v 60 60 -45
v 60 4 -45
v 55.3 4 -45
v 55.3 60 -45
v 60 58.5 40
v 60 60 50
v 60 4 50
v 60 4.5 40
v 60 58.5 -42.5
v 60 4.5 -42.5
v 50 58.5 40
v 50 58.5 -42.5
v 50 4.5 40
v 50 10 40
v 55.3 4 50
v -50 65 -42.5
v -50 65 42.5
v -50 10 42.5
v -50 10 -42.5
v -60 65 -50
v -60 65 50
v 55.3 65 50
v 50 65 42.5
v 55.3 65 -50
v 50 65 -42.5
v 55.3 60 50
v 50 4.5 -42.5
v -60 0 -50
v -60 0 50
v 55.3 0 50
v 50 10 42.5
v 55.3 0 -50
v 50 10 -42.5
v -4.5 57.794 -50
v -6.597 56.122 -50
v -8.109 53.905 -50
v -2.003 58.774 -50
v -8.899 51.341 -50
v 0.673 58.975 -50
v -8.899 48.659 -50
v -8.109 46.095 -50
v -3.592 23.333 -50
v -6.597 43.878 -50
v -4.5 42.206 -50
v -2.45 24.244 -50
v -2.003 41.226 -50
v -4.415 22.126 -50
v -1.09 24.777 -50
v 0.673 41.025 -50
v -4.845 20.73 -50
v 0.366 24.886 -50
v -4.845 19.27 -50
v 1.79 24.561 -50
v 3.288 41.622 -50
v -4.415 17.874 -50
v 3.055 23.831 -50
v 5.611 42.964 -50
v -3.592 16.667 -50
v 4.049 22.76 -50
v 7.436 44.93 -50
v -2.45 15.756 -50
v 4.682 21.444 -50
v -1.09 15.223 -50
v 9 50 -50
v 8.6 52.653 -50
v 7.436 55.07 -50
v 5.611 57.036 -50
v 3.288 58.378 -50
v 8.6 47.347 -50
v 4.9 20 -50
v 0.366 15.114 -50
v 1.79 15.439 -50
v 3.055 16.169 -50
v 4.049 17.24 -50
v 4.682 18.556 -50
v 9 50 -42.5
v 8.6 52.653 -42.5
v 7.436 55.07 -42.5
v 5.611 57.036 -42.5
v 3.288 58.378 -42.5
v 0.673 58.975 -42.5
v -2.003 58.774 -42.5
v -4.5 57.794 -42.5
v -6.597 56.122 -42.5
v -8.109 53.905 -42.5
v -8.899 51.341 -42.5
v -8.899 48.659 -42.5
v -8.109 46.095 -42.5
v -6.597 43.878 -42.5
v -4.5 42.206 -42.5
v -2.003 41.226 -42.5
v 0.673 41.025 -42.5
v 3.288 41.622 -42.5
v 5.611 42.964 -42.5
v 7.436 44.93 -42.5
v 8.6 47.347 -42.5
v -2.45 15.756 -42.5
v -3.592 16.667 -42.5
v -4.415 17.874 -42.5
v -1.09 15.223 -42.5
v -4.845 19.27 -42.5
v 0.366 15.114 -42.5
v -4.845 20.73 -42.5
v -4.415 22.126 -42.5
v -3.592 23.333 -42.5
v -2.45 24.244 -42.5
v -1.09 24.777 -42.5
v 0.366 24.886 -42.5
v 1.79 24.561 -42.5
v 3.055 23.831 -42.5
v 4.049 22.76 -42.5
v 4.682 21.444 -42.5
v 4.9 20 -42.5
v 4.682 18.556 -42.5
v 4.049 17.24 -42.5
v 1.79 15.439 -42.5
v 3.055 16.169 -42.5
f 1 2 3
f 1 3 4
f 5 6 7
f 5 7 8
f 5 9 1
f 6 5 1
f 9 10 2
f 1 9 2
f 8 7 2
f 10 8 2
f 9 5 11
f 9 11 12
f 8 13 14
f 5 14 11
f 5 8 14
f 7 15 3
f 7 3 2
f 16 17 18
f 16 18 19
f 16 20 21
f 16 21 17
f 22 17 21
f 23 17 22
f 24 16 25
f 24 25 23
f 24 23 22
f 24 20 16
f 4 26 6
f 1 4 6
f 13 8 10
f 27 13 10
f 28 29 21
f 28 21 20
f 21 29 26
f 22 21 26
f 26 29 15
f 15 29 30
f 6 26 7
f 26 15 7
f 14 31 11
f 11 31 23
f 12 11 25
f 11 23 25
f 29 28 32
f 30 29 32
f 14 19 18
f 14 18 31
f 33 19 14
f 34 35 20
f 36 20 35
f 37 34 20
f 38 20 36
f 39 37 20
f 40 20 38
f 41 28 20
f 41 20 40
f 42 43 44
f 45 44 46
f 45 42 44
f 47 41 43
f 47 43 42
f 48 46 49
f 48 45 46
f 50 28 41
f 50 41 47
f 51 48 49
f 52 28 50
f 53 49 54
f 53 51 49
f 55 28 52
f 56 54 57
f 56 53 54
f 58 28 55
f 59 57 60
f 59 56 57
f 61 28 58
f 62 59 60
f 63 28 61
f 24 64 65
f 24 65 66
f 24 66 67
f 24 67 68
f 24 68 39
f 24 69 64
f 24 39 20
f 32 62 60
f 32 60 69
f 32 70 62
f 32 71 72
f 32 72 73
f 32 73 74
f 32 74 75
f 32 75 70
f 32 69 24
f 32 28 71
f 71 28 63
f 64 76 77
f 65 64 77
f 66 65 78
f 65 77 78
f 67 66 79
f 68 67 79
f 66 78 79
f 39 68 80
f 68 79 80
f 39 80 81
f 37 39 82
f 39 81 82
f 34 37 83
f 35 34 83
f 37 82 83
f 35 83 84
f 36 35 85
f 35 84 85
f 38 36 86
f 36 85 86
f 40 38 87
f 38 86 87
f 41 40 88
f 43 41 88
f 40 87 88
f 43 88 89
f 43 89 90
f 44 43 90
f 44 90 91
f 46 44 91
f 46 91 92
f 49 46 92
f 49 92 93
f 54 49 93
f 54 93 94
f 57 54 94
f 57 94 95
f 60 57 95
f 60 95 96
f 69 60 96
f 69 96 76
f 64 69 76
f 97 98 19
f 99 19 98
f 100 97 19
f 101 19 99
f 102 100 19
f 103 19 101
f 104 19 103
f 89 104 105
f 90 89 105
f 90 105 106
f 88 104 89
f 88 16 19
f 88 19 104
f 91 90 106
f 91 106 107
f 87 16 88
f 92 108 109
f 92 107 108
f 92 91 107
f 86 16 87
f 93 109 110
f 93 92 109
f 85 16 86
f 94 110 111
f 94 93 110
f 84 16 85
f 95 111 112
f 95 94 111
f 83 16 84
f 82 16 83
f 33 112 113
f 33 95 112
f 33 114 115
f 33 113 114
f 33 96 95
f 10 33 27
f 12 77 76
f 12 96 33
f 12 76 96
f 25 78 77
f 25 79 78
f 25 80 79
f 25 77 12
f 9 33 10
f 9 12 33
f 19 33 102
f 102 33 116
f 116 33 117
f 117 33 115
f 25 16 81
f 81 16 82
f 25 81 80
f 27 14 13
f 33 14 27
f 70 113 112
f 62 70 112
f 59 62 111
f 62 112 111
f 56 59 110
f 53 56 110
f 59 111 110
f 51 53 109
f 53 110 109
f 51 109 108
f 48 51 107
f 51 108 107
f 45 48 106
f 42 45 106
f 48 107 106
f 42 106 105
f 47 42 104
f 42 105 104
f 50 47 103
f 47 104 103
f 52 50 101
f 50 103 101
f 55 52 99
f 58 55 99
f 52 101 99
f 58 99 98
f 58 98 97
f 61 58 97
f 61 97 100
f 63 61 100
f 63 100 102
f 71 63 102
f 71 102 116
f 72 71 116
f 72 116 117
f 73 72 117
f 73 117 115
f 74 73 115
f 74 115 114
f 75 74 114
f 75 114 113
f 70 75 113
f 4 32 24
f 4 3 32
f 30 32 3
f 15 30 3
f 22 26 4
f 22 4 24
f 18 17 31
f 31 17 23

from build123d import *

# Parameters (mm, degrees)
SKETCH2_W           = 120
SKETCH2_H           = 100
BOSS_EXTRUDE2_DEPTH = 65
SKETCH3_W           = 100
SKETCH3_H           = 85
CUT_EXTRUDE1_DEPTH  = 55
SKETCH6_R           = 9
SKETCH6_R_2         = 4.9
CUT_EXTRUDE3_DEPTH  = 30
SKETCH8_W           = 4.7
SKETCH8_H           = 4
SKETCH8_H_2         = 5
CUT_EXTRUDE6_DEPTH  = 95
SKETCH9_W           = 5
SKETCH9_H           = 65
CUT_EXTRUDE7_DEPTH  = 4.7
SKETCH10_W          = 82.5
SKETCH10_H          = 54
CUT_EXTRUDE9_DEPTH  = 10


with BuildPart() as part:
    # Sketch2 → Boss-Extrude2 (new body)
    with BuildSketch(Plane(origin=(0, 0, 0), x_dir=(1, 0, 0), z_dir=(0, 1, 0))):
        Rectangle(SKETCH2_W, SKETCH2_H)
    extrude(amount=BOSS_EXTRUDE2_DEPTH)

    # Sketch3 → Cut-Extrude1 (cut)
    with BuildSketch(Plane(origin=(0, 65, 0), x_dir=(1, 0, 0), z_dir=(0, 1, 0))):
        Rectangle(SKETCH3_W, SKETCH3_H)
    extrude(amount=-CUT_EXTRUDE1_DEPTH, mode=Mode.SUBTRACT)

    # Sketch6 → Cut-Extrude3 (cut)
    with BuildSketch(Plane.XY.offset(-42.5)):
        with Locations((0, 50)):
            Circle(SKETCH6_R)
        with Locations((0, 20)):
            Circle(SKETCH6_R_2)
    extrude(amount=-CUT_EXTRUDE3_DEPTH, mode=Mode.SUBTRACT)

    # Sketch8 → Cut-Extrude6 (cut)
    with BuildSketch(Plane.XY.offset(50)):
        with Locations((57.65, 2)):
            Rectangle(SKETCH8_W, SKETCH8_H)
        with Locations((57.65, 62.5)):
            Rectangle(SKETCH8_W, SKETCH8_H_2)
    extrude(amount=-CUT_EXTRUDE6_DEPTH, mode=Mode.SUBTRACT)

    # Sketch9 → Cut-Extrude7 (cut)
    with BuildSketch(Plane(origin=(60, 0, 0), x_dir=(0, 0, -1), z_dir=(1, 0, 0))):
        with Locations((47.5, 32.5)):
            Rectangle(SKETCH9_W, SKETCH9_H)
    extrude(amount=-CUT_EXTRUDE7_DEPTH, mode=Mode.SUBTRACT)

    # Sketch10 → Cut-Extrude9 (cut)
    with BuildSketch(Plane(origin=(60, 0, 0), x_dir=(0, 0, -1), z_dir=(1, 0, 0))):
        with Locations((1.25, 31.5)):
            Rectangle(SKETCH10_W, SKETCH10_H)
    extrude(amount=-CUT_EXTRUDE9_DEPTH, mode=Mode.SUBTRACT)


solid = part.part
